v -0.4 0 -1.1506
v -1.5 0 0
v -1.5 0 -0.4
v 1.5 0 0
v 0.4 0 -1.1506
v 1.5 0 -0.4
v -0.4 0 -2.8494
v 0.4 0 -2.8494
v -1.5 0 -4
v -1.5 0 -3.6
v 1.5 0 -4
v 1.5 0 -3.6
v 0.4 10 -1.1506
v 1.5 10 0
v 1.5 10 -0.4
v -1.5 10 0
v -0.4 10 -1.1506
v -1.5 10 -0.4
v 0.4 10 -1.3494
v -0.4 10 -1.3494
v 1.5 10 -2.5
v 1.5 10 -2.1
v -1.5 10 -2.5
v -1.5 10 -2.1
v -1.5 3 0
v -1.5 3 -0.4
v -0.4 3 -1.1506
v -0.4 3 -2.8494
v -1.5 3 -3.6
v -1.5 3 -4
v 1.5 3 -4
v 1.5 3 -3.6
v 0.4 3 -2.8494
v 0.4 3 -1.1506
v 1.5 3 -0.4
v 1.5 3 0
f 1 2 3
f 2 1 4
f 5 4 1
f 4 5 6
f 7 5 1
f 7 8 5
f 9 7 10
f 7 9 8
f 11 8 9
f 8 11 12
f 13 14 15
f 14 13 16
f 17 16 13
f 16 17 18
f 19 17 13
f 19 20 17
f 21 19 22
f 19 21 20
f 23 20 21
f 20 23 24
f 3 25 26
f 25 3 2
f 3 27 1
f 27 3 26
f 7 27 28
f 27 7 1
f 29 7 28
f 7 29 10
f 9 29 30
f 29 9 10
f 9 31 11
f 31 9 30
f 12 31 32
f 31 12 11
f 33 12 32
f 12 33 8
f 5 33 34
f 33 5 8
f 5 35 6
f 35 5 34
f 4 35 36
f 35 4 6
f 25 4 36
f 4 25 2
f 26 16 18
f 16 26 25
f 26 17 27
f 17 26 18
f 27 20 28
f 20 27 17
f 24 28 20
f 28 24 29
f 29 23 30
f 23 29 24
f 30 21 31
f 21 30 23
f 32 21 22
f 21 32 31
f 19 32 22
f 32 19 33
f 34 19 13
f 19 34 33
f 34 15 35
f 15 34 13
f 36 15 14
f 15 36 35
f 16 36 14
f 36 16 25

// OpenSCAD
// file: PolygonTube.scad
module PolygonTube(points, points_per_ring) {
    ring_count = len(points) / points_per_ring;
    assert(len(points) == ring_count * points_per_ring);
    
    front_faces = [range(
        points_per_ring - 1,
        0
    )];
    back_faces = [range(
        points_per_ring * (ring_count - 1),
        points_per_ring * ring_count - 1
    )];
    side_faces = [
        each for (ring = [0 : ring_count - 2]) [
            for (point = [0 : points_per_ring - 1]) [
                point + (ring + 0) * points_per_ring,
                (point + 1) % points_per_ring + (ring + 0) * points_per_ring,
                (point + 1) % points_per_ring + (ring + 1) * points_per_ring,
                point + (ring + 1) * points_per_ring,
            ]
        ]
    ];
    faces = concat(front_faces, back_faces, side_faces);
    polyhedron(points, faces);
}
// file: Utils.scad
module mirror_copy(vec=undef) {
    children();
    mirror(vec) children();
}

function dot_product(v1, v2) =
    let(
        max_dim = max(len(v1), len(v2)),
        v1_eff = len(v1) < max_dim ? concat(v1, [for (i = [0 : max_dim - len(v1) - 1]) 0]) : v1,
        v2_eff = len(v2) < max_dim ? concat(v2, [for (i = [0 : max_dim - len(v2) - 1]) 0]) : v2
    )
    (max_dim == 2) ? (v1_eff[0]*v2_eff[0] + v1_eff[1]*v2_eff[1]) :
    (max_dim == 3) ? (v1_eff[0]*v2_eff[0] + v1_eff[1]*v2_eff[1] + v1_eff[2]*v2_eff[2]) :
    0;

function mirror_single_point(p, n) =
    let(
        p_dim = len(p),
        p_calc = (p_dim == 2 && len(n) == 3) ? [p[0], p[1], 0] : p,
        n_calc = (len(n) == 2 && p_dim == 3) ? [n[0], n[1], 0] : n,
        n_norm = (norm(n_calc) == 0) ? n_calc : n_calc / norm(n_calc),
        proj_scalar = dot_product(p_calc, n_norm),
        reflection_vec = [
            2 * proj_scalar * n_norm[0],
            2 * proj_scalar * n_norm[1],
            (len(n_norm) == 3 ? 2 * proj_scalar * n_norm[2] : 0) 
        ]
    )
    (p_dim == 2) ? [
        p[0] - reflection_vec[0],
        p[1] - reflection_vec[1]
    ] : [
        p[0] - reflection_vec[0],
        p[1] - reflection_vec[1],
        p[2] - reflection_vec[2]
    ];


function copy_mirror_points(points, vec = [1, 0, 0]) =
    let(
        mirrored_points = [ for (p = points) mirror_single_point(p, vec) ],
        reversed_mirrored_points = [
            for (i = [len(mirrored_points) - 1 : -1 : 0]) mirrored_points[i]
        ]
    )
    // Step 3: Concatenate the original points with the reversed and mirrored points
    concat(points, reversed_mirrored_points);

module Hex(d) {
    intersection_for(a = [0, 120, 240]) rotate(a) square([d * 2, d], true);
}

function getNum(arg, i) = is_list(arg)?arg[i % len(arg)]:arg;
function range(from, to) = [for (i = [from : (from < to ? 1 : -1): to]) i ];
// main file
include <Utils.scad>
include <PolygonTube.scad>

HBarProfile(
    length    = [3, 10],
    width     = 3,
    height    = [4,4,2.5],
    thickness = 0.4,
    overhang  = 60
);

module HBarProfile(
    length    = [3, 10],
    width     = 3,
    height    = [4,4,2.5],
    thickness = 0.4,
    overhang  = 60
) {
    ring_count = (is_list(length) ? len(length) : 1) + 1;
    points = [
        each for (
            i = [0 : ring_count - 1]
        ) [
            for (
                p2D = HBarProfile_points(
                    getNum(width, i),
                    getNum(height, i),
                    getNum(thickness, i),
                    getNum(overhang, i)
                 )
            ) [
                p2D.x,
                i == 0 ? 0 : (is_num(length)?length:length[i - 1]),
                p2D.y
            ]
        ]
    ];
    ring_node_count = len(points) / ring_count;
    
    PolygonTube(points, ring_node_count);

    function HBarProfile_points(
        width     = 3,
        height    = 3,
        thickness = 0.4,
        overhang  = 60
    ) = (
        let(a         = (width - thickness) / 2 * tan(90 - overhang))
        [
            [-width/2, 0],
            [-width/2, -thickness],
            [-thickness, -thickness - a],
            [-thickness, -height + thickness + a],
            [-width/2, -height + thickness],
            [-width/2, -height],
            [ width/2, -height],
            [ width/2, -height + thickness],
            [ thickness, -height + thickness + a],
            [ thickness, -thickness - a],
            [ width/2, -thickness],
            [ width/2, 0],
        ]
    );
}
